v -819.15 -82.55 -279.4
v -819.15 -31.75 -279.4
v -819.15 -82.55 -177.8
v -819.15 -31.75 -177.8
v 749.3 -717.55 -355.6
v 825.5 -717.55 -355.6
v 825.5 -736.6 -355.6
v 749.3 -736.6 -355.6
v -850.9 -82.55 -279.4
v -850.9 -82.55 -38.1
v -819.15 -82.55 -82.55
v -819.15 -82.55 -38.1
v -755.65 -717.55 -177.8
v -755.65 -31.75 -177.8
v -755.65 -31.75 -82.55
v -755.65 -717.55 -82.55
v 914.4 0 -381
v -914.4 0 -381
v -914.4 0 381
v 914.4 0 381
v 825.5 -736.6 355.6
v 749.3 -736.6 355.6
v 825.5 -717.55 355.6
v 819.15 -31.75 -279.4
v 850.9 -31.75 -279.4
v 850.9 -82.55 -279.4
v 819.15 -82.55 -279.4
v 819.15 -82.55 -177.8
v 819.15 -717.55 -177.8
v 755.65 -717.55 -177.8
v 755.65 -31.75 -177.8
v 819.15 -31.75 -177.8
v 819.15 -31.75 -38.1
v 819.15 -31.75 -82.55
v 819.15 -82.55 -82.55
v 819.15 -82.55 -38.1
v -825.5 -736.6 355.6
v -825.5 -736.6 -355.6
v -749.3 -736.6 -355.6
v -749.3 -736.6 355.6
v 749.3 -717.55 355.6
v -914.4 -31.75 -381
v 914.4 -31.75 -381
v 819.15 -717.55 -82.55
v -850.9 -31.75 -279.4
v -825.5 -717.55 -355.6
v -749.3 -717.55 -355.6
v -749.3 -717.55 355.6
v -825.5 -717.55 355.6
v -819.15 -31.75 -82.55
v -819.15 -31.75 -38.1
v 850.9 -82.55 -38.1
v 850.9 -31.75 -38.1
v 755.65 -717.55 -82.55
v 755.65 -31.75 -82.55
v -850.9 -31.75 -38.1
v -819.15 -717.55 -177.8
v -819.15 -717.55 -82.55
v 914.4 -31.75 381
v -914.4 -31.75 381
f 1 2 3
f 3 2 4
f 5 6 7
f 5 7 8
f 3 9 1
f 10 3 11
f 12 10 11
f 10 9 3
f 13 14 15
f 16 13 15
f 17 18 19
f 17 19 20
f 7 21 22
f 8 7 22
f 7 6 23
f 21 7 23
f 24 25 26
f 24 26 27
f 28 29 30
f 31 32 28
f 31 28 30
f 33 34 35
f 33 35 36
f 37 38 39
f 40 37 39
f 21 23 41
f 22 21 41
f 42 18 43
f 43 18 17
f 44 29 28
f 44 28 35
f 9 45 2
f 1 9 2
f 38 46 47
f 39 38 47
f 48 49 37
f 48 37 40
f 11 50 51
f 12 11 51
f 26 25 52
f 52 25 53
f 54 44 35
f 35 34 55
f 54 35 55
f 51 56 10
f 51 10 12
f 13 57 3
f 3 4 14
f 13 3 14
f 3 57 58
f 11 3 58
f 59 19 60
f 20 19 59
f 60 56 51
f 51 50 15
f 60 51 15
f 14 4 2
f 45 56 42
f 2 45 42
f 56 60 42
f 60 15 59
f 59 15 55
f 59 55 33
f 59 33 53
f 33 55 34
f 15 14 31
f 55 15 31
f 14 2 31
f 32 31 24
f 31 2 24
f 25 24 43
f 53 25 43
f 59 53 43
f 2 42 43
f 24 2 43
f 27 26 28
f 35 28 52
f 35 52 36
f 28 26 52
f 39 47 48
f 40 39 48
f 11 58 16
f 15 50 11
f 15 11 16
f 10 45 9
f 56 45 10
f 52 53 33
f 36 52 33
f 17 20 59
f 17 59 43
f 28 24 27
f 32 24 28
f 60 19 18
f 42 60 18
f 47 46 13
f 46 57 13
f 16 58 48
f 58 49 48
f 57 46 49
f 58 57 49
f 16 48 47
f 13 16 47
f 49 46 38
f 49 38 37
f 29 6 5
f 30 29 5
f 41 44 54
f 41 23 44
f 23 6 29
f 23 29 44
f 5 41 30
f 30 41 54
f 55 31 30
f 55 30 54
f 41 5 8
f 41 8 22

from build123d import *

# Parameters (mm, degrees)
SKETCH1_W           = 1828.8
SKETCH1_H           = 762
BOSS_EXTRUDE1_DEPTH = 31.75
SKETCH2_W           = 31.75
SKETCH2_H           = 241.3
BOSS_EXTRUDE2_DEPTH = 50.8
SKETCH3_W           = 63.5
SKETCH3_H           = 95.25
BOSS_EXTRUDE3_DEPTH = 685.8
SKETCH4_W           = 76.2
SKETCH4_H           = 711.2
BOSS_EXTRUDE4_DEPTH = 19.05


with BuildPart() as part:
    # Sketch1 → Boss-Extrude1 (new body)
    with BuildSketch(Plane(origin=(0, 0, 0), x_dir=(1, 0, 0), z_dir=(0, 1, 0))):
        Rectangle(SKETCH1_W, SKETCH1_H)
    extrude(amount=-BOSS_EXTRUDE1_DEPTH)

    # Sketch2 → Boss-Extrude2 (add)
    with BuildSketch(Plane.XZ.offset(31.75)):
        with Locations((-835.025, -158.75)):
            Rectangle(SKETCH2_W, SKETCH2_H)
    boss_extrude2 = extrude(amount=BOSS_EXTRUDE2_DEPTH)

    # Sketch3 → Boss-Extrude3 (add)
    with BuildSketch(Plane.XZ.offset(31.75)):
        with Locations((-787.4, -130.175)):
            Rectangle(SKETCH3_W, SKETCH3_H)
    boss_extrude3 = extrude(amount=BOSS_EXTRUDE3_DEPTH)

    # Sketch4 → Boss-Extrude4 (add)
    with BuildSketch(Plane.XZ.offset(717.55)):
        with Locations((-787.4, 0)):
            Rectangle(SKETCH4_W, SKETCH4_H)
    boss_extrude4 = extrude(amount=BOSS_EXTRUDE4_DEPTH)

    # Mirror1: Boss-Extrude2, Boss-Extrude3, Boss-Extrude4 across plane
    add(boss_extrude2.mirror(Plane(origin=(0, 0, 0), x_dir=(0, 0, 1), z_dir=(1, 0, 0))))
    add(boss_extrude3.mirror(Plane(origin=(0, 0, 0), x_dir=(0, 0, 1), z_dir=(1, 0, 0))))
    add(boss_extrude4.mirror(Plane(origin=(0, 0, 0), x_dir=(0, 0, 1), z_dir=(1, 0, 0))))


solid = part.part
